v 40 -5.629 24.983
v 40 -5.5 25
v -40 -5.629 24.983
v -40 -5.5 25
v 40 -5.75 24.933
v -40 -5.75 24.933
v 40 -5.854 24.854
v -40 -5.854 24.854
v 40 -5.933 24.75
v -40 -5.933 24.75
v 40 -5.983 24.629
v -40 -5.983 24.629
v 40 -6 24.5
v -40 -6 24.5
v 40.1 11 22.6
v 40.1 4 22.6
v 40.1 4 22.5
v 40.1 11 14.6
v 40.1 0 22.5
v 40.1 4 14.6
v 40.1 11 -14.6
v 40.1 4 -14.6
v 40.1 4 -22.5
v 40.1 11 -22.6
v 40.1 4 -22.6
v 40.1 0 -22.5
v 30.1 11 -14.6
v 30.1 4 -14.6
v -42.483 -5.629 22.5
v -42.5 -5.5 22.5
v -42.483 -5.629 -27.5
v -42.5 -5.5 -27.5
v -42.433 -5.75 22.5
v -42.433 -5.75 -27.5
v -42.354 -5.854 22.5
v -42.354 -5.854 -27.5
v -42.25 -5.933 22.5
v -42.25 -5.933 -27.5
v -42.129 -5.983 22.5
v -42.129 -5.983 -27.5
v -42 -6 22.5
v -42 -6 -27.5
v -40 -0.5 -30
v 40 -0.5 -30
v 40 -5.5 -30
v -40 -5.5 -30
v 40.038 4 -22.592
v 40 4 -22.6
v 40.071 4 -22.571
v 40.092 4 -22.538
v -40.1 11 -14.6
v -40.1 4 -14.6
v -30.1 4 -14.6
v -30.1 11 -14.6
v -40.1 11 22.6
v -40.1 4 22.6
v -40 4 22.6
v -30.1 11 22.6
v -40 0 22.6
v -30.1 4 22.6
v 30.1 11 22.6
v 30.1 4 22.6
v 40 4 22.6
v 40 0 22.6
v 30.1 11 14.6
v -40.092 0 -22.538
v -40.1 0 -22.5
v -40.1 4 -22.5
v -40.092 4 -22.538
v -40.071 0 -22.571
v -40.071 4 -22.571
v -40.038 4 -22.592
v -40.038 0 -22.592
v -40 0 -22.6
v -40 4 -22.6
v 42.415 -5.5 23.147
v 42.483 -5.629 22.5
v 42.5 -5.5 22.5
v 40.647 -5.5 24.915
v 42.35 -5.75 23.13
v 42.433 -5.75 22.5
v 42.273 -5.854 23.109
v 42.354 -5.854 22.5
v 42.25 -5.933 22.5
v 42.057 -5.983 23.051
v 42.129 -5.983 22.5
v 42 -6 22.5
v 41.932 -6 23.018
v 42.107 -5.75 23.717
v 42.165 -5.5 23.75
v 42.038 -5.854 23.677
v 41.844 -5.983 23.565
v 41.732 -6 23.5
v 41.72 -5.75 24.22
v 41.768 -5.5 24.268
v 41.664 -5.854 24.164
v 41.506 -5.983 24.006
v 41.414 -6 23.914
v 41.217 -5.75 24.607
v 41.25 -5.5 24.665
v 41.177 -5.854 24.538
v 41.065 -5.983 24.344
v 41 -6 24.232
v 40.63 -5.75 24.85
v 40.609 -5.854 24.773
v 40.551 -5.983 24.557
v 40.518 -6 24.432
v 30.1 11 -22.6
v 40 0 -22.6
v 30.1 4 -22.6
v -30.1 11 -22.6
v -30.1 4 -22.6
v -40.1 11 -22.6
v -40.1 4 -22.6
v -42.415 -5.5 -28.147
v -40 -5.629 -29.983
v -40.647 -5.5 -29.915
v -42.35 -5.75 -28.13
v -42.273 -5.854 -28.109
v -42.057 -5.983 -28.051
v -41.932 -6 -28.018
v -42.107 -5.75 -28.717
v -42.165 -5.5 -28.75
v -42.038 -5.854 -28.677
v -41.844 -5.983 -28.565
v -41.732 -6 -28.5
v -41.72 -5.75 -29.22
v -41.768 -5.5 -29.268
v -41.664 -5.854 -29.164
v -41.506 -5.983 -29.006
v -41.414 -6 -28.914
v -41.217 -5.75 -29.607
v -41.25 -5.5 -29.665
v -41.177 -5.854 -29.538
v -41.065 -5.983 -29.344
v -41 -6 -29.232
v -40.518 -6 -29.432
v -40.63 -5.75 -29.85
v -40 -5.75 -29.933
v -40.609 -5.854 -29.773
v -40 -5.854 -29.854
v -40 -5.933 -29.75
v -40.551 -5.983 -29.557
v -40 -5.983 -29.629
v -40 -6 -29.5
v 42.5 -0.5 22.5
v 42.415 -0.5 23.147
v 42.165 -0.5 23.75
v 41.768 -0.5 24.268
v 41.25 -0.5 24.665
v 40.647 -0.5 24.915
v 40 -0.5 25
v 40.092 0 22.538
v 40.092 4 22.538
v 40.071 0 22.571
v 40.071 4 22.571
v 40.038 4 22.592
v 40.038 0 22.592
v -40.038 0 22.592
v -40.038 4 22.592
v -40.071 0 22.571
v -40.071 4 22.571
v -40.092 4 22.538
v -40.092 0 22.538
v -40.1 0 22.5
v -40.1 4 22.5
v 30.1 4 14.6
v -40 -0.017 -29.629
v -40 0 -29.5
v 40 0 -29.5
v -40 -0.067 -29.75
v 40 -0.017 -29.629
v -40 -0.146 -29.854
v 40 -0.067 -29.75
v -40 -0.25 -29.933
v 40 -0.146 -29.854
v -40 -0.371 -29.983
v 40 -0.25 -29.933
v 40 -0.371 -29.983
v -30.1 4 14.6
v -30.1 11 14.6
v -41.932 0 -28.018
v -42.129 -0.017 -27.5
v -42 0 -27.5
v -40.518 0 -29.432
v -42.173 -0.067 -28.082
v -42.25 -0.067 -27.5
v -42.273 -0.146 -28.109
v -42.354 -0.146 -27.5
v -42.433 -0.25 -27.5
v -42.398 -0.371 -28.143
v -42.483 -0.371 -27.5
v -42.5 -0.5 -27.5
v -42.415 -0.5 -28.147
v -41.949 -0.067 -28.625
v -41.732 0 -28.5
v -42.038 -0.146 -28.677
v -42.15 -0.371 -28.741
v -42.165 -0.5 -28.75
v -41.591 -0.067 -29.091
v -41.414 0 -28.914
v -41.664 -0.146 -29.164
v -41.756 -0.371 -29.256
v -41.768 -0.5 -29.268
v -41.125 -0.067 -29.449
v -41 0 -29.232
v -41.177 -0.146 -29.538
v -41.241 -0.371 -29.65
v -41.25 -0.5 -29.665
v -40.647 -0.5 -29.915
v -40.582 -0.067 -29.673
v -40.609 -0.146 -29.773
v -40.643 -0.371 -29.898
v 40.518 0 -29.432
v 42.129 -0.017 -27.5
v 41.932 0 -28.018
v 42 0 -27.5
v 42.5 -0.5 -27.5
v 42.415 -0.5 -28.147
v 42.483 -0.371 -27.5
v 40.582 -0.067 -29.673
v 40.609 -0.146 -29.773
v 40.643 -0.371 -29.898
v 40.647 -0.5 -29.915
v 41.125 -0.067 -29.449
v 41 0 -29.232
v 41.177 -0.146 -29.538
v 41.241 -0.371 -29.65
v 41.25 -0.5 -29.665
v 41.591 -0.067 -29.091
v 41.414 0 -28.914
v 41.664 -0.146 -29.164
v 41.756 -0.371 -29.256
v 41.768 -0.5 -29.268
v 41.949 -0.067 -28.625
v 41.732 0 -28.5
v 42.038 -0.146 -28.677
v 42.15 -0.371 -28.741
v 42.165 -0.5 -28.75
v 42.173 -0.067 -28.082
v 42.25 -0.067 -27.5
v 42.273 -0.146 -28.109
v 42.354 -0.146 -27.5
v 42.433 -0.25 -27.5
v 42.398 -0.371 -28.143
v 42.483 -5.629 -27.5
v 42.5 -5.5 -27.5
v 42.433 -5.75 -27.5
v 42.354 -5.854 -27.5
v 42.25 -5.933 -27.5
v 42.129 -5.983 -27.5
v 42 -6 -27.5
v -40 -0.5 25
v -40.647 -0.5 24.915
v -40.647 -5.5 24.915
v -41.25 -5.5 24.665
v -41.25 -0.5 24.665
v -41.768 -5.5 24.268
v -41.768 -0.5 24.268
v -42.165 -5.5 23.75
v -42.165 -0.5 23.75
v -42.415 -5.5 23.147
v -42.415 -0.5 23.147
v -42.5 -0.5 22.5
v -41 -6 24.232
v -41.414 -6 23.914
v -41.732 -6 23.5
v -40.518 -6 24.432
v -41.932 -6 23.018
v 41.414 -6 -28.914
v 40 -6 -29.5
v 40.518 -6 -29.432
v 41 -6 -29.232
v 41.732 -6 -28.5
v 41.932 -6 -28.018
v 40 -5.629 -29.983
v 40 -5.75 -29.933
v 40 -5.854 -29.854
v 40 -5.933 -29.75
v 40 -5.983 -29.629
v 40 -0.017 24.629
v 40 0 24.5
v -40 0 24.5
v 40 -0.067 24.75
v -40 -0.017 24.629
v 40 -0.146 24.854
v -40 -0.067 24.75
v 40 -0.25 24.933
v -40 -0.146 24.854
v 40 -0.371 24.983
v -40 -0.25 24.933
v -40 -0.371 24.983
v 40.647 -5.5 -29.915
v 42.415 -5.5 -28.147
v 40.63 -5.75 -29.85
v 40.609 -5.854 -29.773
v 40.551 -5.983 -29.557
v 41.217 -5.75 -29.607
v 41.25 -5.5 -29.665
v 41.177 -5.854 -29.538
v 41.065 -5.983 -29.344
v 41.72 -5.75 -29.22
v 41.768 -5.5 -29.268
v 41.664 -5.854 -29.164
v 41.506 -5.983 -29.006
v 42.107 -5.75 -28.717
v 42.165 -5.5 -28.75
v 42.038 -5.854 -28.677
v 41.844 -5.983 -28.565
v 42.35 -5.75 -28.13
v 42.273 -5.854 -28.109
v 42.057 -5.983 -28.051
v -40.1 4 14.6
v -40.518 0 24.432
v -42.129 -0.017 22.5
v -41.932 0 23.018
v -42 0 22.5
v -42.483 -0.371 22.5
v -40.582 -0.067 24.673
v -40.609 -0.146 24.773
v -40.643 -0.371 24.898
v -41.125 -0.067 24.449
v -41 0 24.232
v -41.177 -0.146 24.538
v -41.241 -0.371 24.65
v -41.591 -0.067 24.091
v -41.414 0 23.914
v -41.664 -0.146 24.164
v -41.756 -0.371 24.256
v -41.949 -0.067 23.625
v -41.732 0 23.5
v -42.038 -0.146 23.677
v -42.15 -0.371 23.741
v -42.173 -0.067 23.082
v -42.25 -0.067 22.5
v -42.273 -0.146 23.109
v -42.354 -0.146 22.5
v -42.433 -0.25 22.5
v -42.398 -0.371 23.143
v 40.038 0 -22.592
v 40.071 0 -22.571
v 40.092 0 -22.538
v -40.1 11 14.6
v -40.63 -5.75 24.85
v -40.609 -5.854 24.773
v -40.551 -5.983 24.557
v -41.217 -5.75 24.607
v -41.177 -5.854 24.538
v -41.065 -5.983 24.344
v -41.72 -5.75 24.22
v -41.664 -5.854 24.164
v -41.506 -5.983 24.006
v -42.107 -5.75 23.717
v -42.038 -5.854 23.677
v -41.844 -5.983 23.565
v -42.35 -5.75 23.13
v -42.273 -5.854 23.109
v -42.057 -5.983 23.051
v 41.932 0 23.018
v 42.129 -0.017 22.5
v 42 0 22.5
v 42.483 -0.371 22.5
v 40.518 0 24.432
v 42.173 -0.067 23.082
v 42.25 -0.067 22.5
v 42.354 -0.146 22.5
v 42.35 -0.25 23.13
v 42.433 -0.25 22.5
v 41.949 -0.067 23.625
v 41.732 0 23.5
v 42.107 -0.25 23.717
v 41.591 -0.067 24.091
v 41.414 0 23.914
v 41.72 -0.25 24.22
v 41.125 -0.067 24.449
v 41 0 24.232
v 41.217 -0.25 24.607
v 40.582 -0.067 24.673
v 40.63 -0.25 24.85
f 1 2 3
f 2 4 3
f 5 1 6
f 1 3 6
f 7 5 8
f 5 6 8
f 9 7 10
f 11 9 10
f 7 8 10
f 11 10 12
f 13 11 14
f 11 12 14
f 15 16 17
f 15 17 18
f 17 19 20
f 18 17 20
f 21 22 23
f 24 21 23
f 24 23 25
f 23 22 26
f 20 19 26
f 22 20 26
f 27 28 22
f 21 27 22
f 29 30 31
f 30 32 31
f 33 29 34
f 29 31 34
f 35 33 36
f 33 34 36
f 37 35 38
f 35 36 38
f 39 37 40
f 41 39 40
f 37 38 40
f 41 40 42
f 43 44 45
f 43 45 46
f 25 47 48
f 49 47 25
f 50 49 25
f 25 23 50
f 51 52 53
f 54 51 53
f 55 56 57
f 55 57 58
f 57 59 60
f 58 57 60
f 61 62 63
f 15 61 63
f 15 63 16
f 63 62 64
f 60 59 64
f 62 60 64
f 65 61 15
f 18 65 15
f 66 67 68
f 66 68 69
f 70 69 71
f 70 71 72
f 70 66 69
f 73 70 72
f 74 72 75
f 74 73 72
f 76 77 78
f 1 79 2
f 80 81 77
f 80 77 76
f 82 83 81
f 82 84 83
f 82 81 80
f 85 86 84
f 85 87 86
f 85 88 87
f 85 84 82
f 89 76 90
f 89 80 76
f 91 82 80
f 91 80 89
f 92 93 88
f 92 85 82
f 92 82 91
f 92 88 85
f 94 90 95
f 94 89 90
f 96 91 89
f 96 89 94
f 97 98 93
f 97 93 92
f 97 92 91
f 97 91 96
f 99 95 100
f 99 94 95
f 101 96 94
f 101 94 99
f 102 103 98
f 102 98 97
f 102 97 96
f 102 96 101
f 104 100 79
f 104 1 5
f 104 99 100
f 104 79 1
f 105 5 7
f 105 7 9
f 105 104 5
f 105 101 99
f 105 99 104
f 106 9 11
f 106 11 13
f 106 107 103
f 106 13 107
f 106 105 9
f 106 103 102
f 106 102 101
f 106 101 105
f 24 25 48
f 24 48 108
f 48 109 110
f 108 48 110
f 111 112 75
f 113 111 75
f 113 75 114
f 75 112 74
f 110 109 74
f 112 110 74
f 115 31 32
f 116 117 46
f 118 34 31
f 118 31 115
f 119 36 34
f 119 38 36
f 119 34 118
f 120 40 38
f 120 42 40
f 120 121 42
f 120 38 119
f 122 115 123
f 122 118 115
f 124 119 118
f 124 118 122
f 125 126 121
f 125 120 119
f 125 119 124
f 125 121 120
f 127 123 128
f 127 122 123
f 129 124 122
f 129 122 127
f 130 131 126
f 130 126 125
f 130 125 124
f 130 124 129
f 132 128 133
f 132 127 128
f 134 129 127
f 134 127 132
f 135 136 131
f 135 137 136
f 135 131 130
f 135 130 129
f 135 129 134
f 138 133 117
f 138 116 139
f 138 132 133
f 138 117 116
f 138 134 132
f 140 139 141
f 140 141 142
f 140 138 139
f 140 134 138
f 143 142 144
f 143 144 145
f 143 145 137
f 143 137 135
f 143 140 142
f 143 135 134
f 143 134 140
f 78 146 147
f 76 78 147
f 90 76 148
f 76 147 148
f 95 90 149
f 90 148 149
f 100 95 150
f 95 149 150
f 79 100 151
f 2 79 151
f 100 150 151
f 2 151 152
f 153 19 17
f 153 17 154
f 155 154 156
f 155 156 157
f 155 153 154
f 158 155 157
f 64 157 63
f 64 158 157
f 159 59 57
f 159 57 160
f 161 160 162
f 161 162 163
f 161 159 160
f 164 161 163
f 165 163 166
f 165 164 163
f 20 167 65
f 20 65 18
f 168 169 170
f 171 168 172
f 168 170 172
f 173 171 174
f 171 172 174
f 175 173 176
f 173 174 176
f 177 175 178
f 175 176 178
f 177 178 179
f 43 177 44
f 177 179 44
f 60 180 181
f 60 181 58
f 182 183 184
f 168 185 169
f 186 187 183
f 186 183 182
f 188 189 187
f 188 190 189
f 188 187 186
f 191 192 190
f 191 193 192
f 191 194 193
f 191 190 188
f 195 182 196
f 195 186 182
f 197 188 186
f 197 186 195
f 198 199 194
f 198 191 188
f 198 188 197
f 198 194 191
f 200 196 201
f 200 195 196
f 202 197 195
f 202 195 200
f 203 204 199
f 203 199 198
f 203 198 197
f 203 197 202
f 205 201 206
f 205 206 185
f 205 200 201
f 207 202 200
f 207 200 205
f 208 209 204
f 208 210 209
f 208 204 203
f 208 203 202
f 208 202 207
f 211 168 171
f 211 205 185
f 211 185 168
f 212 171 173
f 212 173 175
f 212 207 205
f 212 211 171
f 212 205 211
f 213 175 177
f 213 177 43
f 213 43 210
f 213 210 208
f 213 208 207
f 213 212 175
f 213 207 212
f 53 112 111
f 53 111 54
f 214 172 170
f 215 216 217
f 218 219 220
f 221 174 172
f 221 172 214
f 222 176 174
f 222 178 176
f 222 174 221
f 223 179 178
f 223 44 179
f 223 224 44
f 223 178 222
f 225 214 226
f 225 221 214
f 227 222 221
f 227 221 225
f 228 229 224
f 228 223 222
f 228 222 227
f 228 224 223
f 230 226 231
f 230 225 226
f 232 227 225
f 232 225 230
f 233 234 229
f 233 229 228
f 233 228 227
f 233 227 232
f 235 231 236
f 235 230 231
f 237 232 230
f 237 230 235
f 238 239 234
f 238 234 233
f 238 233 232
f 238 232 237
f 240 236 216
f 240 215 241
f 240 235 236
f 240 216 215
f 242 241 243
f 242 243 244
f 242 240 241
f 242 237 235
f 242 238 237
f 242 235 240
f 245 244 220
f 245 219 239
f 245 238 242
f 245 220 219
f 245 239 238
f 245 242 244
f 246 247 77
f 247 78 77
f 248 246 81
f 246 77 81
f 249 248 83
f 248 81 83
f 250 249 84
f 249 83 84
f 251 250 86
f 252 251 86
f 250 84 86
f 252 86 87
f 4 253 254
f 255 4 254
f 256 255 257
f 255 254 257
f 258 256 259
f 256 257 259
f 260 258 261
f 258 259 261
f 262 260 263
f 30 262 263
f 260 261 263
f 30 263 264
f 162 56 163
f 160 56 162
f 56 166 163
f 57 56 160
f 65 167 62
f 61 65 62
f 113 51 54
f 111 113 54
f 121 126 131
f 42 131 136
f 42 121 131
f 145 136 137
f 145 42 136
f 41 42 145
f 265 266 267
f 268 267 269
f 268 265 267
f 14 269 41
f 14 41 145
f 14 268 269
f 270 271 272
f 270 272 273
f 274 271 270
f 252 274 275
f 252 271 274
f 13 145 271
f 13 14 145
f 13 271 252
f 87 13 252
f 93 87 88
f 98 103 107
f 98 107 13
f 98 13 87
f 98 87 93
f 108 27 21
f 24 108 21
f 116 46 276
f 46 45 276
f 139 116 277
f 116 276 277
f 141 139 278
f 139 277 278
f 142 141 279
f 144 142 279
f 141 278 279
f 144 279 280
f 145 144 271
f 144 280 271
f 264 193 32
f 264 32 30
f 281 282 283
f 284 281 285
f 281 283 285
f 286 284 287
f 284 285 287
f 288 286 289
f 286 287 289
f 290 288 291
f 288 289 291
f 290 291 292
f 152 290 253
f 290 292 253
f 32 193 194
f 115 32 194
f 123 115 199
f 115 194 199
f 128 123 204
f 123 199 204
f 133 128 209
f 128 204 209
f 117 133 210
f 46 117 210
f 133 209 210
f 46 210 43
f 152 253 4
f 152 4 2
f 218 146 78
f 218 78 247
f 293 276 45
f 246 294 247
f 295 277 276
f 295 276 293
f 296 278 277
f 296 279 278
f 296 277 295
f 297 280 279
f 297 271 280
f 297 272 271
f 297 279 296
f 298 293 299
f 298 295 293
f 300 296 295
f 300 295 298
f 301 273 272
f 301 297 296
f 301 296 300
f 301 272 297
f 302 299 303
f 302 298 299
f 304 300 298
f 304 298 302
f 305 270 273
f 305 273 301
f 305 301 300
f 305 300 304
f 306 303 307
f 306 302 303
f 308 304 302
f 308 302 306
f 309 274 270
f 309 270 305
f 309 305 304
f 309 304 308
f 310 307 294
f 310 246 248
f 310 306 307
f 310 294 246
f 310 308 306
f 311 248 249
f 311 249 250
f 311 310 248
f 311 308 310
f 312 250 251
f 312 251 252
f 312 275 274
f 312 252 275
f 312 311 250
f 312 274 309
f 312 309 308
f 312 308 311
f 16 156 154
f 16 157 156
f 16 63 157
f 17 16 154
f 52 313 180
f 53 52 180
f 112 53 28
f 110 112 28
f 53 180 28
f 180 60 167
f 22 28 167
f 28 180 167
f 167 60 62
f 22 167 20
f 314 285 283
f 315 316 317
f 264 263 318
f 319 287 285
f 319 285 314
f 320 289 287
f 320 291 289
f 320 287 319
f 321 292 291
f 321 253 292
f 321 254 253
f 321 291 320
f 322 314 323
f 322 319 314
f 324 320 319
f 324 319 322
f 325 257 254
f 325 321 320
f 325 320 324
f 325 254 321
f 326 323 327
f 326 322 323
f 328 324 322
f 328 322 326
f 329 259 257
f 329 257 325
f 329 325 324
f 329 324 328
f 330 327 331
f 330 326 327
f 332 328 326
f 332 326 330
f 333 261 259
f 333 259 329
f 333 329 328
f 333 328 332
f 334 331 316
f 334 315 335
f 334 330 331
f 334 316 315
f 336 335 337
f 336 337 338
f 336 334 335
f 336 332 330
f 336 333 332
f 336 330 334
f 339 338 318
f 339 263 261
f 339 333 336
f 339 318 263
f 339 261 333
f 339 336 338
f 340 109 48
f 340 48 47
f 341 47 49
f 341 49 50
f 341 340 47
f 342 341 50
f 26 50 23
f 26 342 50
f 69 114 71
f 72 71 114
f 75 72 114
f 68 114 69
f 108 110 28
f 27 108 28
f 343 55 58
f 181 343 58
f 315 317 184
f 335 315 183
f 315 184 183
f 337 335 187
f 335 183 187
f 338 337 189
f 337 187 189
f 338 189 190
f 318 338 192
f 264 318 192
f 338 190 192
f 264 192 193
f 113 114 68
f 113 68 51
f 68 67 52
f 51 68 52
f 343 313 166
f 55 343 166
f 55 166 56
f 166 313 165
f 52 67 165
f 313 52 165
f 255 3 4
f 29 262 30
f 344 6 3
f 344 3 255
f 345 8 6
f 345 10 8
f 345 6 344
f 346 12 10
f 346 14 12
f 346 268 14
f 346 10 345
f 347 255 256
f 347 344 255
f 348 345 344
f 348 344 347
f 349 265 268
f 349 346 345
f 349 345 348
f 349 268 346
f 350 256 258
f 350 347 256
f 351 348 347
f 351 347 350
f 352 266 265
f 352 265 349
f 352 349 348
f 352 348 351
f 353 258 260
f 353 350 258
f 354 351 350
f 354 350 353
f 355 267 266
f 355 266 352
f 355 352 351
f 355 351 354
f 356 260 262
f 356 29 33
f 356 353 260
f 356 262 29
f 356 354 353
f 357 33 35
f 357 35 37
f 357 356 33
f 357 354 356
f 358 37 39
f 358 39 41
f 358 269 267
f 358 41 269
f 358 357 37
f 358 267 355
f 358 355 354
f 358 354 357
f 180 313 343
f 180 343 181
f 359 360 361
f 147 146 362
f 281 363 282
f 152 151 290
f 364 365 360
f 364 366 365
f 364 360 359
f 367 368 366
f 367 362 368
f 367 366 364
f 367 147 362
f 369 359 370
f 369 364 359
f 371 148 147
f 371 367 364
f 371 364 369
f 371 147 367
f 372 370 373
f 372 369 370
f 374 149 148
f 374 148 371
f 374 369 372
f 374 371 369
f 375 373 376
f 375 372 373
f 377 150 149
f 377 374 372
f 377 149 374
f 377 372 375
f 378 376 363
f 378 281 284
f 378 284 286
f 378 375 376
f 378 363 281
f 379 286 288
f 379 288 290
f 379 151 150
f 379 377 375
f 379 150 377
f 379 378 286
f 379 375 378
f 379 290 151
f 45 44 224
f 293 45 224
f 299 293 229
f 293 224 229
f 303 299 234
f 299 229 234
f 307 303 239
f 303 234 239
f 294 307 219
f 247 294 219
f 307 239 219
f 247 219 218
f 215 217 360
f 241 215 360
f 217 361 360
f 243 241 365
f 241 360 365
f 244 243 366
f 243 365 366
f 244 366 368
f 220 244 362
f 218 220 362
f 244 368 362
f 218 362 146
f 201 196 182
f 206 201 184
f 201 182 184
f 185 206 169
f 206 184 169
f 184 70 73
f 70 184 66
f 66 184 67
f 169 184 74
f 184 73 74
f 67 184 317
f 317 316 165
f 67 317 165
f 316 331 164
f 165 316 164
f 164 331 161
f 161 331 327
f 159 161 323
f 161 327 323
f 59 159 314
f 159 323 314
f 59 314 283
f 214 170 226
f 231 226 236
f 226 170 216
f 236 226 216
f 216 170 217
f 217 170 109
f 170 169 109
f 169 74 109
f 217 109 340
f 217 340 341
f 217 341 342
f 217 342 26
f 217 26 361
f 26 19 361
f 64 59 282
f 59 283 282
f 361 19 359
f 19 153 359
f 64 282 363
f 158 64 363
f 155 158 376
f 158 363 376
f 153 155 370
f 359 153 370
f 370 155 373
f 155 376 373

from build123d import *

# Parameters (mm, degrees)
PAD001_DEPTH = 6
PAD002_DEPTH = 4
SKETCH_W     = 10
SKETCH_H     = 8
PAD_DEPTH    = 7
FILLET_R     = 0.5


with BuildPart() as part:
    # Sketch008 → Pad001 (new body)
    with BuildSketch(Plane.XZ):
        with BuildLine():
            ThreePointArc((-40, 25), (-41.767767, 24.267767), (-42.5, 22.5))
            Line((-42.5, -27.5), (-42.5, 22.5))
            ThreePointArc((-42.5, -27.5), (-41.767767, -29.267767), (-40, -30))
            Line((40, -30), (-40, -30))
            ThreePointArc((40, -30), (41.767767, -29.267767), (42.5, -27.5))
            Line((42.5, 22.5), (42.5, -27.5))
            ThreePointArc((42.5, 22.5), (41.767767, 24.267767), (40, 25))
            Line((-40, 25), (40, 25))
        make_face()
    extrude(amount=PAD001_DEPTH)

    # Sketch009 → Pad002 (join)
    with BuildSketch(Plane.XZ):
        with BuildLine():
            ThreePointArc((-40, 22.6), (-40.070711, 22.570711), (-40.1, 22.5))
            Line((-40.1, -22.5), (-40.1, 22.5))
            ThreePointArc((-40.1, -22.5), (-40.070711, -22.570711), (-40, -22.6))
            Line((40, -22.6), (-40, -22.6))
            ThreePointArc((40, -22.6), (40.070711, -22.570711), (40.1, -22.5))
            Line((40.1, 22.5), (40.1, -22.5))
            ThreePointArc((40.1, 22.5), (40.070711, 22.570711), (40, 22.6))
            Line((-40, 22.6), (40, 22.6))
        make_face()
    extrude(amount=-PAD002_DEPTH)

    # Sketch → Pad (join)
    with BuildSketch(Plane.XZ.offset(-4)):
        with Locations((-35.1, 18.6)):
            Rectangle(SKETCH_W, SKETCH_H)
        with Locations((35.1, 18.6)):
            Rectangle(SKETCH_W, SKETCH_H)
        with Locations((35.1, -18.6)):
            Rectangle(SKETCH_W, SKETCH_H)
        with Locations((-35.1, -18.6)):
            Rectangle(SKETCH_W, SKETCH_H)
    extrude(amount=-PAD_DEPTH)

    # Fillet
    fillet_edges = [part.edges().sort_by_distance(p)[0] for p in [
        (-41.767767, -6, 24.267767),
        (0, -6, 25),
        (41.767767, -6, 24.267767),
        (42.5, -6, -2.5),
        (41.767767, -6, -29.267767),
        (0, -6, -30),
        (-41.767767, -6, -29.267767),
        (-42.5, -6, -2.5),
        (41.767767, 0, 24.267767),
        (0, 0, 25),
        (42.5, 0, -2.5),
        (41.767767, 0, -29.267767),
        (0, 0, -30),
        (-41.767767, 0, -29.267767),
        (-42.5, 0, -2.5),
        (-41.767767, 0, 24.267767),
    ]]
    fillet(fillet_edges, radius=FILLET_R)


solid = part.part
